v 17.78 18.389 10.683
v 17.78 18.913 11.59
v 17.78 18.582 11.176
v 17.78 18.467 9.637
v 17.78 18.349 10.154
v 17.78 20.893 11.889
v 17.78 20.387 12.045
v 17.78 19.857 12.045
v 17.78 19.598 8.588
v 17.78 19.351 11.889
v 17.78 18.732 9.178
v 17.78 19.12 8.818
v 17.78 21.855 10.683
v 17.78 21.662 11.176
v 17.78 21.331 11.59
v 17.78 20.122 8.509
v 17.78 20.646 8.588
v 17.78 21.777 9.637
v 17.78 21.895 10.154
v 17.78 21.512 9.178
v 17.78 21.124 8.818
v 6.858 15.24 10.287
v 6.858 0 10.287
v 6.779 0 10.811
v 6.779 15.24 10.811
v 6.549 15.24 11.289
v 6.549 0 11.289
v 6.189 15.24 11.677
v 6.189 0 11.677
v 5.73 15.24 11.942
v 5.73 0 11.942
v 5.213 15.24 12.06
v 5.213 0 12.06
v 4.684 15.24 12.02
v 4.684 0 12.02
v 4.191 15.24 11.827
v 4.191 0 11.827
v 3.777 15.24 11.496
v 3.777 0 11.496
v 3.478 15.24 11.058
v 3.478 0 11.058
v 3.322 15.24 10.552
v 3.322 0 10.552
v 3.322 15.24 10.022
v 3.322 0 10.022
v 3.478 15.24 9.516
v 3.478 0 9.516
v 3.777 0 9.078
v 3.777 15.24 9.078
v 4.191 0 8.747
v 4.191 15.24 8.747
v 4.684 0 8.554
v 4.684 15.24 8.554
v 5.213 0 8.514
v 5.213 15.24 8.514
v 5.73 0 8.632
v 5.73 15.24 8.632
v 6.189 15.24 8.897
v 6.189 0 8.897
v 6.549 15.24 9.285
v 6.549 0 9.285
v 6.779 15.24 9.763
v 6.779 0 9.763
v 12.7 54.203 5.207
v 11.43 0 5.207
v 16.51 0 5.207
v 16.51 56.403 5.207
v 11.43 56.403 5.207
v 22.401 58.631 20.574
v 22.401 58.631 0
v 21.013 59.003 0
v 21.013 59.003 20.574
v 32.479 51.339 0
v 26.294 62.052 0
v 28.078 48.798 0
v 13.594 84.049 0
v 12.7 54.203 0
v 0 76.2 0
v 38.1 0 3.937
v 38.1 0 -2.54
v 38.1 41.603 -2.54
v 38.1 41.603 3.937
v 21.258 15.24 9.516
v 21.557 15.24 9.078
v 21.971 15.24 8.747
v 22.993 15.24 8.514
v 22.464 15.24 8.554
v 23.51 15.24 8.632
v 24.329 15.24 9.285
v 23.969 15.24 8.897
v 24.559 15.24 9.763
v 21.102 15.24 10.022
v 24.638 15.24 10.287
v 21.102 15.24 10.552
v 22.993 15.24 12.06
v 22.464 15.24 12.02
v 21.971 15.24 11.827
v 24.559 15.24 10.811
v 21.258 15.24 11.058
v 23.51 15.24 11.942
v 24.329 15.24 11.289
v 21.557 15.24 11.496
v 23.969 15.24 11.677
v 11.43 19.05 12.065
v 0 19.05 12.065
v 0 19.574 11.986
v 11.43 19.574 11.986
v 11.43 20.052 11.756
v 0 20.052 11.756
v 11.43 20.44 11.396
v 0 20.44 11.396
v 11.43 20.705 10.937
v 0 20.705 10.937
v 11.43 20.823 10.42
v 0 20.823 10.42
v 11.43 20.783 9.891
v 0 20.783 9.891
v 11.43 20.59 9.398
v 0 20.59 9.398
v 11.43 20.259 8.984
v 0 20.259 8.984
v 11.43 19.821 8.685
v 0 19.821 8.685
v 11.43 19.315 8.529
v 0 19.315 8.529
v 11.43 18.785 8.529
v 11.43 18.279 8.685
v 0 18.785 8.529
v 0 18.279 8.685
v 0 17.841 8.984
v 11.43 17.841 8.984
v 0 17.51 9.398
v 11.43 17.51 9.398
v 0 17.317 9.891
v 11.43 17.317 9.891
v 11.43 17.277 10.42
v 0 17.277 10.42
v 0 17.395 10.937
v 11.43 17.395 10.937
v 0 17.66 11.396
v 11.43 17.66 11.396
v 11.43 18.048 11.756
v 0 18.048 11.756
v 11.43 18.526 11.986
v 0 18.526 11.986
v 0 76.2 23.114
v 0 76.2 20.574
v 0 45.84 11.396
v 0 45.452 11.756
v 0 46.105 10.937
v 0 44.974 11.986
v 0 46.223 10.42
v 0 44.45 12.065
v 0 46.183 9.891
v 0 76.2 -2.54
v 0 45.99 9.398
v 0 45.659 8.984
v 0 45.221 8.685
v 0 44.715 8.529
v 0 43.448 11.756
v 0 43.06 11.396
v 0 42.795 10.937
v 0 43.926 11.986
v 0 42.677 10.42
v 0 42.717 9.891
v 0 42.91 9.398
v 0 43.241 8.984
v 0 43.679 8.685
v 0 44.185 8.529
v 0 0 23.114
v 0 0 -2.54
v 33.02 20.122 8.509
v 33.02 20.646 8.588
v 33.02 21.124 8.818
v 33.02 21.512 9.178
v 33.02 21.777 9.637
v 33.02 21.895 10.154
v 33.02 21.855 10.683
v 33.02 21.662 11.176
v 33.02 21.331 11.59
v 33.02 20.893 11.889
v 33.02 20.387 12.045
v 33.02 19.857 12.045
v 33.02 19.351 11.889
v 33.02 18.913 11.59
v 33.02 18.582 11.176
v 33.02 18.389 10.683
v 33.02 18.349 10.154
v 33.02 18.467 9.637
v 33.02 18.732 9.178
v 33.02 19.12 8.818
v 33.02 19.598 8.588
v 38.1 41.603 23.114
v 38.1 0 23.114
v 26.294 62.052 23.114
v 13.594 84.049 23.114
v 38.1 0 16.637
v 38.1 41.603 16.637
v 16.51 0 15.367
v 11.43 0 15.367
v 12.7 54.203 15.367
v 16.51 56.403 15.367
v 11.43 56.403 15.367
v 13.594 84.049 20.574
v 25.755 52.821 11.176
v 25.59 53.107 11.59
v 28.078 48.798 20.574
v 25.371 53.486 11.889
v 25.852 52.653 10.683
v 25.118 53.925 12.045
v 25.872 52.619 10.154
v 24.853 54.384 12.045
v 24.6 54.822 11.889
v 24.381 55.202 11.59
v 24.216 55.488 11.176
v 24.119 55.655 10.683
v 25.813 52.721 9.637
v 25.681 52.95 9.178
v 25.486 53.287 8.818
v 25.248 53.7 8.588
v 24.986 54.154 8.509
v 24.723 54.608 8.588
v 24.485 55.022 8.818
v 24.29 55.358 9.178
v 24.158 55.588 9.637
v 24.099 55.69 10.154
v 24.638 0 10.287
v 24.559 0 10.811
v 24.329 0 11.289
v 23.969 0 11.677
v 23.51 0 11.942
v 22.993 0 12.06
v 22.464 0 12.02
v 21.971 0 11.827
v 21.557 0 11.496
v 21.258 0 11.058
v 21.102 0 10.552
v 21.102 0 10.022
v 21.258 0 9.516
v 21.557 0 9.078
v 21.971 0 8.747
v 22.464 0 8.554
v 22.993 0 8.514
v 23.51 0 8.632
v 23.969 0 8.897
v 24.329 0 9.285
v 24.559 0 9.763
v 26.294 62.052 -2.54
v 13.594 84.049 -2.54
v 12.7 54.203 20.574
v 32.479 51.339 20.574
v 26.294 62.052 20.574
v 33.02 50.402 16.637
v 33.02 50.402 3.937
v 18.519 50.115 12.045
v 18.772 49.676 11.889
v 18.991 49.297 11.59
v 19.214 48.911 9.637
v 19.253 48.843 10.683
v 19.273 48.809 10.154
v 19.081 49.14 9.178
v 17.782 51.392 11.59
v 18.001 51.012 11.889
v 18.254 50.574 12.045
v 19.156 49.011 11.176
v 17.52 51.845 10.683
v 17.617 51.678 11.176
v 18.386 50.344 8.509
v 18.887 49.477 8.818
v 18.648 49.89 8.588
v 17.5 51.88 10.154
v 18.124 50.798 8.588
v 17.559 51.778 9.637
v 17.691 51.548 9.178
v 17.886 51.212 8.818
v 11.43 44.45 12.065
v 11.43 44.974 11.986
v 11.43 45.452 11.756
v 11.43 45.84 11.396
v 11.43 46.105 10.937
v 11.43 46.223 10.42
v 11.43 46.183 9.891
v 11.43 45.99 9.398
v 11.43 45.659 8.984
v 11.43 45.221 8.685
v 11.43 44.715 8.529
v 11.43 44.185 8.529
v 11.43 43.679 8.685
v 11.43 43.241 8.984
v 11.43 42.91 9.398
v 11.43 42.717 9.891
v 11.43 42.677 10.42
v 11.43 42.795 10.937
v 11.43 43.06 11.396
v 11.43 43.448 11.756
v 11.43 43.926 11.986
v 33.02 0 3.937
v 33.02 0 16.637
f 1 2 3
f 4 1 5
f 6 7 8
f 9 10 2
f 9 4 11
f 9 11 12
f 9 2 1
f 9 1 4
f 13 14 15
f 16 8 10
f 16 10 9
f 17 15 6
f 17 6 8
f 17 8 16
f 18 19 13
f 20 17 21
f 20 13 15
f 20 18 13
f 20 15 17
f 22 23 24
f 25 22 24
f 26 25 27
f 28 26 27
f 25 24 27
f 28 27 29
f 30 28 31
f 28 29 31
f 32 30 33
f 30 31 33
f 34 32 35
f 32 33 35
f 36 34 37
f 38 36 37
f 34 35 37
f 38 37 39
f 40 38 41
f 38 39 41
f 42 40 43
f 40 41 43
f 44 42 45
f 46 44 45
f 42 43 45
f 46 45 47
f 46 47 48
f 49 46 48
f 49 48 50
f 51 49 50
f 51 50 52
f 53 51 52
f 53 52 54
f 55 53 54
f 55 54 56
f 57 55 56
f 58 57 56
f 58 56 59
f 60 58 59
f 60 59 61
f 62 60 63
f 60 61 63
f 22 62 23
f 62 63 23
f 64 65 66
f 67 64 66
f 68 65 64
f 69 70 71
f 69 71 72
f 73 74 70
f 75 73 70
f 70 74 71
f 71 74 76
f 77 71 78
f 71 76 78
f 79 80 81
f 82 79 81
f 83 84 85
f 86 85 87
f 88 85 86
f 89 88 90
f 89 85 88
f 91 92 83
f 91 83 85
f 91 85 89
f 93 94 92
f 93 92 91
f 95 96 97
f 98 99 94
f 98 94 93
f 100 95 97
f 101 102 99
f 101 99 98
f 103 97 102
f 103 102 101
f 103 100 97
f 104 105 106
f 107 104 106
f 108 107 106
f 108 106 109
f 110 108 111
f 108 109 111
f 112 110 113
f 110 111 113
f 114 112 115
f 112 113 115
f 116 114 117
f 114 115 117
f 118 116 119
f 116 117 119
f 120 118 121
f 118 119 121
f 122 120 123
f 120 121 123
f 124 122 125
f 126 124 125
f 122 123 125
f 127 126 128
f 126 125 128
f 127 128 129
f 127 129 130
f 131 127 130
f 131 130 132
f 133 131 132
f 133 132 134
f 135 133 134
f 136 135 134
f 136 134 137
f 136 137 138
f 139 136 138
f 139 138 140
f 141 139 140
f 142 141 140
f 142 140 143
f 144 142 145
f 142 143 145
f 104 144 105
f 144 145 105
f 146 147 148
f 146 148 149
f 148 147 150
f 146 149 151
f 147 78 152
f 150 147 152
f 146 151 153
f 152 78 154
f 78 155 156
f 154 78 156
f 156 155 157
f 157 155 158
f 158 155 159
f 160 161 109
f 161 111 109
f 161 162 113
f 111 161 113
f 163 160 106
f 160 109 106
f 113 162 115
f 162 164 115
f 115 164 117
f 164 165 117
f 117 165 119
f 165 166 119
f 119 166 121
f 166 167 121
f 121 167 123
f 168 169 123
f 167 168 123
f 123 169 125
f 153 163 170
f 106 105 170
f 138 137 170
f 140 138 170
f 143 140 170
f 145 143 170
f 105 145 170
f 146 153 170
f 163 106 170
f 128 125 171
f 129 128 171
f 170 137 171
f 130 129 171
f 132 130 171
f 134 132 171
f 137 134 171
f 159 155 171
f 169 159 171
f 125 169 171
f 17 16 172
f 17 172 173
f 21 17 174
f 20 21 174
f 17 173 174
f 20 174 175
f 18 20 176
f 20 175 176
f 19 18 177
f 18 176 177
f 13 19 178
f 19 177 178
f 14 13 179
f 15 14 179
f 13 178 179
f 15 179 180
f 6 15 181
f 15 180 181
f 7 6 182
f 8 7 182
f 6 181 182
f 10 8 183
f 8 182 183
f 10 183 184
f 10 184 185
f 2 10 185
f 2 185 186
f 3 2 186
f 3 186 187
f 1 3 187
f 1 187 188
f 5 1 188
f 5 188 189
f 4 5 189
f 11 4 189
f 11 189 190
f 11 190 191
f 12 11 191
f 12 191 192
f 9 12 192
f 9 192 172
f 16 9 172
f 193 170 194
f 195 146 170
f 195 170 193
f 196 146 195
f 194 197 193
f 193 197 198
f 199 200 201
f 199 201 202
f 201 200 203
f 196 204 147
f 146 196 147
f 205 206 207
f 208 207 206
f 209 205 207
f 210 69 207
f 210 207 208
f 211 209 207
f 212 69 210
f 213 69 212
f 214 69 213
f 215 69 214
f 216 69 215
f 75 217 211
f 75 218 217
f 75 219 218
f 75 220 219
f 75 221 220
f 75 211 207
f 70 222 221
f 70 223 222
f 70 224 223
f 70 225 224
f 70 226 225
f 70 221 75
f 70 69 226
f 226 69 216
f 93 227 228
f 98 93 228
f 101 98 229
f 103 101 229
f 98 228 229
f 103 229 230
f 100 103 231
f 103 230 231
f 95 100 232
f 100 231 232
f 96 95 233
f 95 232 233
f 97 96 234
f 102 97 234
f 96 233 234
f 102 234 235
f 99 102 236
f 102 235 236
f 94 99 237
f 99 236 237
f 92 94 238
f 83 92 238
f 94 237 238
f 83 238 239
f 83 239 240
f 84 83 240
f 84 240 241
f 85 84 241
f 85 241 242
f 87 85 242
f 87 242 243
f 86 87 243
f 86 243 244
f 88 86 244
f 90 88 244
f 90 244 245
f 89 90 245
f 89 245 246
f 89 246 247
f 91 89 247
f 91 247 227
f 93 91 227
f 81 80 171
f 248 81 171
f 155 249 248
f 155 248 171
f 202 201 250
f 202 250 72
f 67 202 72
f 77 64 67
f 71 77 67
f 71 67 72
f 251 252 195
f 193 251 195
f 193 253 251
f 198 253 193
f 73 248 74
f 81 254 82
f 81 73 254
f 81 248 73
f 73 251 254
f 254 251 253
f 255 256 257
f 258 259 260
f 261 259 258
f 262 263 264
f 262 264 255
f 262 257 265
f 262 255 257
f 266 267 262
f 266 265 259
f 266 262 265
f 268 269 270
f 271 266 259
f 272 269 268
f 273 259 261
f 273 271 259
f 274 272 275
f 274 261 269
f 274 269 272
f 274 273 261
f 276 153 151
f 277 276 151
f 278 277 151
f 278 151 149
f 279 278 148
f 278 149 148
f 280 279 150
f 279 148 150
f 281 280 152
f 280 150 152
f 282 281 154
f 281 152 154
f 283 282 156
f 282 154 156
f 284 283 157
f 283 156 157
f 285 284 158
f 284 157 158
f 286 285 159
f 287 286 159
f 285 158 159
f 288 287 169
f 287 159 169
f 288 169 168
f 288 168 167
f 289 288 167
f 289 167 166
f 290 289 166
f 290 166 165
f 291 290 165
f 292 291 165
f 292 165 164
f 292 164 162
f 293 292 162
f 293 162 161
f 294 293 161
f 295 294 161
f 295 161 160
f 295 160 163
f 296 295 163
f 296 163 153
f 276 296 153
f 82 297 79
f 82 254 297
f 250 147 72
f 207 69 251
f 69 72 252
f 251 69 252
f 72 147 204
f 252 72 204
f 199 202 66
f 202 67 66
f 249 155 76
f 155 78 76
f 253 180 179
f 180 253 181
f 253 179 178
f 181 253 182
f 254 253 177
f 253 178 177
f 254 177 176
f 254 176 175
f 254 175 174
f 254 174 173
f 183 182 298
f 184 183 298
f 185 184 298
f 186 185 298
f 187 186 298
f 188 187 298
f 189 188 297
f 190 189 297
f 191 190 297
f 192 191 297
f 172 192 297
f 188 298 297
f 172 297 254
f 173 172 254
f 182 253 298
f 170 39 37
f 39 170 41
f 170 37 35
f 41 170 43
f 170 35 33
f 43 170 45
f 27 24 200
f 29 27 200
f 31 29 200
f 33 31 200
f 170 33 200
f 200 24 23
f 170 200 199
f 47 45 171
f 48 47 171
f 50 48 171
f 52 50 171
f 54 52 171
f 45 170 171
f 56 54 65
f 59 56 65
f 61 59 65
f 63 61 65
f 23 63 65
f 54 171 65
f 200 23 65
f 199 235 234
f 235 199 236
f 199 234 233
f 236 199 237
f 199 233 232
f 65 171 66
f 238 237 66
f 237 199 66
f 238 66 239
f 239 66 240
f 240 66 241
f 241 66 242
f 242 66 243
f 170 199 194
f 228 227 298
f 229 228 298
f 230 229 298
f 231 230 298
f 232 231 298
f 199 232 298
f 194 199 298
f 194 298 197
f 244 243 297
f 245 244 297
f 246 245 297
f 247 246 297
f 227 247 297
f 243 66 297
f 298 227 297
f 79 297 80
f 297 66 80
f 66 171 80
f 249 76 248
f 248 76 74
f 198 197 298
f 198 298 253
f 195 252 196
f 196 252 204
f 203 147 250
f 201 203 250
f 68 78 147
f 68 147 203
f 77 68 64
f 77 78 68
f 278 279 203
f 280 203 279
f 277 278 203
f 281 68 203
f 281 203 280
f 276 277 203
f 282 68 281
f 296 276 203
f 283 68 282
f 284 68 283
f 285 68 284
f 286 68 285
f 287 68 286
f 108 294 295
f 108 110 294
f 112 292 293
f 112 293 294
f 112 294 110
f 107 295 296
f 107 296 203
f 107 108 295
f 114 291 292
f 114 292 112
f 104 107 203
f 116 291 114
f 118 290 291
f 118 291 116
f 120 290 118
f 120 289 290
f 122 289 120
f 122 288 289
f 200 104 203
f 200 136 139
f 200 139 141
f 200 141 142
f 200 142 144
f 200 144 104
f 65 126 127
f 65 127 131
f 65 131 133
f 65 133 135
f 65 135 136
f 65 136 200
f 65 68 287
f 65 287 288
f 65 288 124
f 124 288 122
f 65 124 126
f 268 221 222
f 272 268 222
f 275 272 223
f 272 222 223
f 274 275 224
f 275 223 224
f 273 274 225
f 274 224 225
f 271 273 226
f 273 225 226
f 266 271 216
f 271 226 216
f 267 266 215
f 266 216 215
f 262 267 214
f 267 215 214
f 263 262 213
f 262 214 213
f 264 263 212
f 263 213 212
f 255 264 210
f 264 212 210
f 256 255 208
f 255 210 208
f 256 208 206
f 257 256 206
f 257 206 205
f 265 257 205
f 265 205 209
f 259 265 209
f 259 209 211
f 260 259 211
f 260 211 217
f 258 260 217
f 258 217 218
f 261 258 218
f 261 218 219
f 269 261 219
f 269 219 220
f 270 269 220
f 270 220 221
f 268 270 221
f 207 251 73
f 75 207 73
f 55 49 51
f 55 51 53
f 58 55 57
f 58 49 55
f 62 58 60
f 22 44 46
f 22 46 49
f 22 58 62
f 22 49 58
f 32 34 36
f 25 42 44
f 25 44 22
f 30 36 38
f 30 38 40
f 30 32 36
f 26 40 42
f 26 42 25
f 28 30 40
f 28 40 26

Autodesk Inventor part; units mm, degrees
ref_plane "YZ Plane" through (0, 0, 0) normal (1, 0, 0) x (0, 1, 0)
ref_plane "XZ Plane" through (0, 0, 0) normal (0, 1, 0) x (-1, 0, 0)
sketch "Sketch1" plane through (0, 0, 0) normal (0, 0, 1) x (1, 0, 0)
  line L0 (0, 0) -> (38.1, 0)
  line L1 (38.1, 0) -> (38.1, 41.6033)
  line L2 (0, 76.2) -> (0, 0)
  line L3 (0, 76.2) -> (13.5942, 84.0486)
  line L4 (0, 76.2) -> (12.7, 54.203)
  line L5 (12.7, 54.203) -> (26.2942, 62.0516)
  line L6 (26.2942, 62.0516) -> (13.5942, 84.0486)
  line L7 (26.2942, 62.0516) -> (38.1, 41.6033)
  dimension "d0" = 15.6972
  dimension "d1" = 25.4
  dimension "d2" = 38.1
  dimension "d3" = 76.2
  dimension "d4" = 120
extrude "Extrusion1" add sketch "Sketch1" along normal blind 20.574 contours L2 L4 L5 L7 L1 L0
sketch "Sketch2" plane through (0, 0, 20.574) normal (0, 0, 1) x (1, 0, 0)
  line L0 (0, 76.2) -> (0, 0) projected
  line L1 (0, 0) -> (38.1, 0) projected
  line L2 (38.1, 0) -> (38.1, 41.6033) projected
  line L3 (38.1, 41.6033) -> (26.2942, 62.0516) projected
  line L4 (26.2942, 62.0516) -> (12.7, 54.203) projected
  line L5 (12.7, 54.203) -> (0, 76.2) projected
  line L6 (26.2942, 62.0516) -> (13.5942, 84.0486)
  line L7 (13.5942, 84.0486) -> (0, 76.2)
  line L8 (38.1, 41.6033) -> (26.2942, 62.0516) projected
extrude "Extrusion2" add sketch "Sketch2" along normal blind 2.54
ref_plane "Work Plane1" through (0, 0, 10.287) normal (0, 0, -1) x (-1, 0, 0)
mirror "Mirror1" about plane through (0, 0, 10.287) normal (0, 0, -1) of "Extrusion2"
sketch "Sketch3" plane through (0, 0, 23.114) normal (0, -1, 0) x (1, 0, 0)
  line L0 (38.1, -25.654) -> (38.1, 0) projected
  line L1 (38.1, -6.477) -> (33.02, -6.477)
  line L2 (33.02, -6.477) -> (33.02, -19.177)
  line L3 (33.02, -19.177) -> (38.1, -19.177)
  line L4 (38.1, -19.177) -> (38.1, -6.477)
  point P0 (0, -23.114)
  point P1 (38.1, -12.827)
  point P2 (38.1, -19.177)
  dimension "d9" = 12.7
  dimension "d10" = 6.35
  dimension "d11" = 5.08
extrude "Extrusion3" cut sketch "Sketch3" against normal blind 65.0875
sketch "Sketch4" plane through (33.02, 0, 16.637) normal (1, 0, 0) x (0, 0, -1)
  circle A0 centre (6.35, 20.122) radius 1.778 projected
  point P0 (16.637, 0)
extrude "Extrusion4" cut sketch "Sketch4" against normal blind 15.24
sketch "Sketch5" plane through (13.5942, 84.0486, 23.114) normal (0.8660254, 0.5, 0) x (0, 0, -1)
  line L0 (23.114, -25.4) -> (2.54, -25.4) projected
  line L1 (23.114, -25.4) -> (2.54, -25.4)
  line L2 (2.54, -25.4) -> (2.54, -37.7698)
  line L3 (2.54, -37.7698) -> (23.114, -37.7698)
  line L4 (23.114, -37.7698) -> (23.114, -25.4)
  point P0 (23.114, -65.9911)
  dimension "d16" = 12.3698
extrude "Extrusion5" cut sketch "Sketch5" against normal blind 5.08
chamfer "Chamfer1" distance 1.016 angle 45 1 edges at (21.893, 59.5106, 10.287)
sketch "Sketch6" plane through (9.1948, 81.5086, 23.114) normal (0.8660254, 0.5, 0) x (0, 0, -1)
  line L0 (2.54, -39.2429) -> (2.54, -0.5012) projected
  line L1 (2.54, -25.4) -> (22.86, -25.4) projected
  line L2 (23.114, -37.7698) -> (2.54, -37.7698) projected
  line L3 (2.54, -37.7698) -> (2.54, 0) projected
  line L4 (2.54, -25.4) -> (2.54, -37.7698)
  circle A0 centre (12.827, -31.5849) radius 1.778
  line L5 (23.114, -37.7698) -> (2.54, -37.7698) projected
  point P0 (23.114, -65.9911)
  point P1 (2.54, -31.5849)
  point P2 (12.827, -37.7698)
  dimension "d22" = 3.556
extrude "Extrusion6" cut sketch "Sketch6" against normal blind 7.62
ref_plane "Work Plane2" through (0, 0, 10.287) normal (0, 0, 1) x (1, 0, 0)
sketch "Sketch7" plane through (0, 0, 10.287) normal (0, 0, 1) x (1, 0, 0)
  line L0 (21.0149, 59.0036) -> (12.7, 54.203) projected
  line L1 (16.51, 56.4027) -> (11.43, 56.4027)
  line L2 (12.7, 54.203) -> (0, 76.2) projected
  line L3 (16.51, 56.4027) -> (16.51, 0)
  line L4 (0, 0) -> (38.1, 0) projected
  line L5 (11.43, 56.4027) -> (11.43, 0)
  line L6 (11.43, 0) -> (16.51, 0)
  dimension "d25" = 5.08
extrude "Extrusion7" cut sketch "Sketch7" along normal mid plane 10.16 contours L3 L4 L5 L2 L0
sketch "Sketch8" plane through (0, 0, 23.114) normal (-1, 0, 0) x (0, 0, 1)
  circle A0 centre (-12.827, 44.45) radius 1.778 projected
  circle A1 centre (-12.827, 19.05) radius 1.778 projected
  point P0 (-23.114, 0)
extrude "Extrusion8" cut sketch "Sketch8" against normal blind 15.24
sketch "Sketch9" plane through (0, 0, 23.114) normal (0, -1, 0) x (1, 0, 0)
  circle A0 centre (5.08, -12.827) radius 1.778 projected
  circle A1 centre (22.86, -12.827) radius 1.778 projected
  point P0 (0, -23.114)
extrude "Extrusion9" cut sketch "Sketch9" against normal blind 15.24
equation "\"d10\" = 0.5 * d9"
properties part number "PALM 2"
